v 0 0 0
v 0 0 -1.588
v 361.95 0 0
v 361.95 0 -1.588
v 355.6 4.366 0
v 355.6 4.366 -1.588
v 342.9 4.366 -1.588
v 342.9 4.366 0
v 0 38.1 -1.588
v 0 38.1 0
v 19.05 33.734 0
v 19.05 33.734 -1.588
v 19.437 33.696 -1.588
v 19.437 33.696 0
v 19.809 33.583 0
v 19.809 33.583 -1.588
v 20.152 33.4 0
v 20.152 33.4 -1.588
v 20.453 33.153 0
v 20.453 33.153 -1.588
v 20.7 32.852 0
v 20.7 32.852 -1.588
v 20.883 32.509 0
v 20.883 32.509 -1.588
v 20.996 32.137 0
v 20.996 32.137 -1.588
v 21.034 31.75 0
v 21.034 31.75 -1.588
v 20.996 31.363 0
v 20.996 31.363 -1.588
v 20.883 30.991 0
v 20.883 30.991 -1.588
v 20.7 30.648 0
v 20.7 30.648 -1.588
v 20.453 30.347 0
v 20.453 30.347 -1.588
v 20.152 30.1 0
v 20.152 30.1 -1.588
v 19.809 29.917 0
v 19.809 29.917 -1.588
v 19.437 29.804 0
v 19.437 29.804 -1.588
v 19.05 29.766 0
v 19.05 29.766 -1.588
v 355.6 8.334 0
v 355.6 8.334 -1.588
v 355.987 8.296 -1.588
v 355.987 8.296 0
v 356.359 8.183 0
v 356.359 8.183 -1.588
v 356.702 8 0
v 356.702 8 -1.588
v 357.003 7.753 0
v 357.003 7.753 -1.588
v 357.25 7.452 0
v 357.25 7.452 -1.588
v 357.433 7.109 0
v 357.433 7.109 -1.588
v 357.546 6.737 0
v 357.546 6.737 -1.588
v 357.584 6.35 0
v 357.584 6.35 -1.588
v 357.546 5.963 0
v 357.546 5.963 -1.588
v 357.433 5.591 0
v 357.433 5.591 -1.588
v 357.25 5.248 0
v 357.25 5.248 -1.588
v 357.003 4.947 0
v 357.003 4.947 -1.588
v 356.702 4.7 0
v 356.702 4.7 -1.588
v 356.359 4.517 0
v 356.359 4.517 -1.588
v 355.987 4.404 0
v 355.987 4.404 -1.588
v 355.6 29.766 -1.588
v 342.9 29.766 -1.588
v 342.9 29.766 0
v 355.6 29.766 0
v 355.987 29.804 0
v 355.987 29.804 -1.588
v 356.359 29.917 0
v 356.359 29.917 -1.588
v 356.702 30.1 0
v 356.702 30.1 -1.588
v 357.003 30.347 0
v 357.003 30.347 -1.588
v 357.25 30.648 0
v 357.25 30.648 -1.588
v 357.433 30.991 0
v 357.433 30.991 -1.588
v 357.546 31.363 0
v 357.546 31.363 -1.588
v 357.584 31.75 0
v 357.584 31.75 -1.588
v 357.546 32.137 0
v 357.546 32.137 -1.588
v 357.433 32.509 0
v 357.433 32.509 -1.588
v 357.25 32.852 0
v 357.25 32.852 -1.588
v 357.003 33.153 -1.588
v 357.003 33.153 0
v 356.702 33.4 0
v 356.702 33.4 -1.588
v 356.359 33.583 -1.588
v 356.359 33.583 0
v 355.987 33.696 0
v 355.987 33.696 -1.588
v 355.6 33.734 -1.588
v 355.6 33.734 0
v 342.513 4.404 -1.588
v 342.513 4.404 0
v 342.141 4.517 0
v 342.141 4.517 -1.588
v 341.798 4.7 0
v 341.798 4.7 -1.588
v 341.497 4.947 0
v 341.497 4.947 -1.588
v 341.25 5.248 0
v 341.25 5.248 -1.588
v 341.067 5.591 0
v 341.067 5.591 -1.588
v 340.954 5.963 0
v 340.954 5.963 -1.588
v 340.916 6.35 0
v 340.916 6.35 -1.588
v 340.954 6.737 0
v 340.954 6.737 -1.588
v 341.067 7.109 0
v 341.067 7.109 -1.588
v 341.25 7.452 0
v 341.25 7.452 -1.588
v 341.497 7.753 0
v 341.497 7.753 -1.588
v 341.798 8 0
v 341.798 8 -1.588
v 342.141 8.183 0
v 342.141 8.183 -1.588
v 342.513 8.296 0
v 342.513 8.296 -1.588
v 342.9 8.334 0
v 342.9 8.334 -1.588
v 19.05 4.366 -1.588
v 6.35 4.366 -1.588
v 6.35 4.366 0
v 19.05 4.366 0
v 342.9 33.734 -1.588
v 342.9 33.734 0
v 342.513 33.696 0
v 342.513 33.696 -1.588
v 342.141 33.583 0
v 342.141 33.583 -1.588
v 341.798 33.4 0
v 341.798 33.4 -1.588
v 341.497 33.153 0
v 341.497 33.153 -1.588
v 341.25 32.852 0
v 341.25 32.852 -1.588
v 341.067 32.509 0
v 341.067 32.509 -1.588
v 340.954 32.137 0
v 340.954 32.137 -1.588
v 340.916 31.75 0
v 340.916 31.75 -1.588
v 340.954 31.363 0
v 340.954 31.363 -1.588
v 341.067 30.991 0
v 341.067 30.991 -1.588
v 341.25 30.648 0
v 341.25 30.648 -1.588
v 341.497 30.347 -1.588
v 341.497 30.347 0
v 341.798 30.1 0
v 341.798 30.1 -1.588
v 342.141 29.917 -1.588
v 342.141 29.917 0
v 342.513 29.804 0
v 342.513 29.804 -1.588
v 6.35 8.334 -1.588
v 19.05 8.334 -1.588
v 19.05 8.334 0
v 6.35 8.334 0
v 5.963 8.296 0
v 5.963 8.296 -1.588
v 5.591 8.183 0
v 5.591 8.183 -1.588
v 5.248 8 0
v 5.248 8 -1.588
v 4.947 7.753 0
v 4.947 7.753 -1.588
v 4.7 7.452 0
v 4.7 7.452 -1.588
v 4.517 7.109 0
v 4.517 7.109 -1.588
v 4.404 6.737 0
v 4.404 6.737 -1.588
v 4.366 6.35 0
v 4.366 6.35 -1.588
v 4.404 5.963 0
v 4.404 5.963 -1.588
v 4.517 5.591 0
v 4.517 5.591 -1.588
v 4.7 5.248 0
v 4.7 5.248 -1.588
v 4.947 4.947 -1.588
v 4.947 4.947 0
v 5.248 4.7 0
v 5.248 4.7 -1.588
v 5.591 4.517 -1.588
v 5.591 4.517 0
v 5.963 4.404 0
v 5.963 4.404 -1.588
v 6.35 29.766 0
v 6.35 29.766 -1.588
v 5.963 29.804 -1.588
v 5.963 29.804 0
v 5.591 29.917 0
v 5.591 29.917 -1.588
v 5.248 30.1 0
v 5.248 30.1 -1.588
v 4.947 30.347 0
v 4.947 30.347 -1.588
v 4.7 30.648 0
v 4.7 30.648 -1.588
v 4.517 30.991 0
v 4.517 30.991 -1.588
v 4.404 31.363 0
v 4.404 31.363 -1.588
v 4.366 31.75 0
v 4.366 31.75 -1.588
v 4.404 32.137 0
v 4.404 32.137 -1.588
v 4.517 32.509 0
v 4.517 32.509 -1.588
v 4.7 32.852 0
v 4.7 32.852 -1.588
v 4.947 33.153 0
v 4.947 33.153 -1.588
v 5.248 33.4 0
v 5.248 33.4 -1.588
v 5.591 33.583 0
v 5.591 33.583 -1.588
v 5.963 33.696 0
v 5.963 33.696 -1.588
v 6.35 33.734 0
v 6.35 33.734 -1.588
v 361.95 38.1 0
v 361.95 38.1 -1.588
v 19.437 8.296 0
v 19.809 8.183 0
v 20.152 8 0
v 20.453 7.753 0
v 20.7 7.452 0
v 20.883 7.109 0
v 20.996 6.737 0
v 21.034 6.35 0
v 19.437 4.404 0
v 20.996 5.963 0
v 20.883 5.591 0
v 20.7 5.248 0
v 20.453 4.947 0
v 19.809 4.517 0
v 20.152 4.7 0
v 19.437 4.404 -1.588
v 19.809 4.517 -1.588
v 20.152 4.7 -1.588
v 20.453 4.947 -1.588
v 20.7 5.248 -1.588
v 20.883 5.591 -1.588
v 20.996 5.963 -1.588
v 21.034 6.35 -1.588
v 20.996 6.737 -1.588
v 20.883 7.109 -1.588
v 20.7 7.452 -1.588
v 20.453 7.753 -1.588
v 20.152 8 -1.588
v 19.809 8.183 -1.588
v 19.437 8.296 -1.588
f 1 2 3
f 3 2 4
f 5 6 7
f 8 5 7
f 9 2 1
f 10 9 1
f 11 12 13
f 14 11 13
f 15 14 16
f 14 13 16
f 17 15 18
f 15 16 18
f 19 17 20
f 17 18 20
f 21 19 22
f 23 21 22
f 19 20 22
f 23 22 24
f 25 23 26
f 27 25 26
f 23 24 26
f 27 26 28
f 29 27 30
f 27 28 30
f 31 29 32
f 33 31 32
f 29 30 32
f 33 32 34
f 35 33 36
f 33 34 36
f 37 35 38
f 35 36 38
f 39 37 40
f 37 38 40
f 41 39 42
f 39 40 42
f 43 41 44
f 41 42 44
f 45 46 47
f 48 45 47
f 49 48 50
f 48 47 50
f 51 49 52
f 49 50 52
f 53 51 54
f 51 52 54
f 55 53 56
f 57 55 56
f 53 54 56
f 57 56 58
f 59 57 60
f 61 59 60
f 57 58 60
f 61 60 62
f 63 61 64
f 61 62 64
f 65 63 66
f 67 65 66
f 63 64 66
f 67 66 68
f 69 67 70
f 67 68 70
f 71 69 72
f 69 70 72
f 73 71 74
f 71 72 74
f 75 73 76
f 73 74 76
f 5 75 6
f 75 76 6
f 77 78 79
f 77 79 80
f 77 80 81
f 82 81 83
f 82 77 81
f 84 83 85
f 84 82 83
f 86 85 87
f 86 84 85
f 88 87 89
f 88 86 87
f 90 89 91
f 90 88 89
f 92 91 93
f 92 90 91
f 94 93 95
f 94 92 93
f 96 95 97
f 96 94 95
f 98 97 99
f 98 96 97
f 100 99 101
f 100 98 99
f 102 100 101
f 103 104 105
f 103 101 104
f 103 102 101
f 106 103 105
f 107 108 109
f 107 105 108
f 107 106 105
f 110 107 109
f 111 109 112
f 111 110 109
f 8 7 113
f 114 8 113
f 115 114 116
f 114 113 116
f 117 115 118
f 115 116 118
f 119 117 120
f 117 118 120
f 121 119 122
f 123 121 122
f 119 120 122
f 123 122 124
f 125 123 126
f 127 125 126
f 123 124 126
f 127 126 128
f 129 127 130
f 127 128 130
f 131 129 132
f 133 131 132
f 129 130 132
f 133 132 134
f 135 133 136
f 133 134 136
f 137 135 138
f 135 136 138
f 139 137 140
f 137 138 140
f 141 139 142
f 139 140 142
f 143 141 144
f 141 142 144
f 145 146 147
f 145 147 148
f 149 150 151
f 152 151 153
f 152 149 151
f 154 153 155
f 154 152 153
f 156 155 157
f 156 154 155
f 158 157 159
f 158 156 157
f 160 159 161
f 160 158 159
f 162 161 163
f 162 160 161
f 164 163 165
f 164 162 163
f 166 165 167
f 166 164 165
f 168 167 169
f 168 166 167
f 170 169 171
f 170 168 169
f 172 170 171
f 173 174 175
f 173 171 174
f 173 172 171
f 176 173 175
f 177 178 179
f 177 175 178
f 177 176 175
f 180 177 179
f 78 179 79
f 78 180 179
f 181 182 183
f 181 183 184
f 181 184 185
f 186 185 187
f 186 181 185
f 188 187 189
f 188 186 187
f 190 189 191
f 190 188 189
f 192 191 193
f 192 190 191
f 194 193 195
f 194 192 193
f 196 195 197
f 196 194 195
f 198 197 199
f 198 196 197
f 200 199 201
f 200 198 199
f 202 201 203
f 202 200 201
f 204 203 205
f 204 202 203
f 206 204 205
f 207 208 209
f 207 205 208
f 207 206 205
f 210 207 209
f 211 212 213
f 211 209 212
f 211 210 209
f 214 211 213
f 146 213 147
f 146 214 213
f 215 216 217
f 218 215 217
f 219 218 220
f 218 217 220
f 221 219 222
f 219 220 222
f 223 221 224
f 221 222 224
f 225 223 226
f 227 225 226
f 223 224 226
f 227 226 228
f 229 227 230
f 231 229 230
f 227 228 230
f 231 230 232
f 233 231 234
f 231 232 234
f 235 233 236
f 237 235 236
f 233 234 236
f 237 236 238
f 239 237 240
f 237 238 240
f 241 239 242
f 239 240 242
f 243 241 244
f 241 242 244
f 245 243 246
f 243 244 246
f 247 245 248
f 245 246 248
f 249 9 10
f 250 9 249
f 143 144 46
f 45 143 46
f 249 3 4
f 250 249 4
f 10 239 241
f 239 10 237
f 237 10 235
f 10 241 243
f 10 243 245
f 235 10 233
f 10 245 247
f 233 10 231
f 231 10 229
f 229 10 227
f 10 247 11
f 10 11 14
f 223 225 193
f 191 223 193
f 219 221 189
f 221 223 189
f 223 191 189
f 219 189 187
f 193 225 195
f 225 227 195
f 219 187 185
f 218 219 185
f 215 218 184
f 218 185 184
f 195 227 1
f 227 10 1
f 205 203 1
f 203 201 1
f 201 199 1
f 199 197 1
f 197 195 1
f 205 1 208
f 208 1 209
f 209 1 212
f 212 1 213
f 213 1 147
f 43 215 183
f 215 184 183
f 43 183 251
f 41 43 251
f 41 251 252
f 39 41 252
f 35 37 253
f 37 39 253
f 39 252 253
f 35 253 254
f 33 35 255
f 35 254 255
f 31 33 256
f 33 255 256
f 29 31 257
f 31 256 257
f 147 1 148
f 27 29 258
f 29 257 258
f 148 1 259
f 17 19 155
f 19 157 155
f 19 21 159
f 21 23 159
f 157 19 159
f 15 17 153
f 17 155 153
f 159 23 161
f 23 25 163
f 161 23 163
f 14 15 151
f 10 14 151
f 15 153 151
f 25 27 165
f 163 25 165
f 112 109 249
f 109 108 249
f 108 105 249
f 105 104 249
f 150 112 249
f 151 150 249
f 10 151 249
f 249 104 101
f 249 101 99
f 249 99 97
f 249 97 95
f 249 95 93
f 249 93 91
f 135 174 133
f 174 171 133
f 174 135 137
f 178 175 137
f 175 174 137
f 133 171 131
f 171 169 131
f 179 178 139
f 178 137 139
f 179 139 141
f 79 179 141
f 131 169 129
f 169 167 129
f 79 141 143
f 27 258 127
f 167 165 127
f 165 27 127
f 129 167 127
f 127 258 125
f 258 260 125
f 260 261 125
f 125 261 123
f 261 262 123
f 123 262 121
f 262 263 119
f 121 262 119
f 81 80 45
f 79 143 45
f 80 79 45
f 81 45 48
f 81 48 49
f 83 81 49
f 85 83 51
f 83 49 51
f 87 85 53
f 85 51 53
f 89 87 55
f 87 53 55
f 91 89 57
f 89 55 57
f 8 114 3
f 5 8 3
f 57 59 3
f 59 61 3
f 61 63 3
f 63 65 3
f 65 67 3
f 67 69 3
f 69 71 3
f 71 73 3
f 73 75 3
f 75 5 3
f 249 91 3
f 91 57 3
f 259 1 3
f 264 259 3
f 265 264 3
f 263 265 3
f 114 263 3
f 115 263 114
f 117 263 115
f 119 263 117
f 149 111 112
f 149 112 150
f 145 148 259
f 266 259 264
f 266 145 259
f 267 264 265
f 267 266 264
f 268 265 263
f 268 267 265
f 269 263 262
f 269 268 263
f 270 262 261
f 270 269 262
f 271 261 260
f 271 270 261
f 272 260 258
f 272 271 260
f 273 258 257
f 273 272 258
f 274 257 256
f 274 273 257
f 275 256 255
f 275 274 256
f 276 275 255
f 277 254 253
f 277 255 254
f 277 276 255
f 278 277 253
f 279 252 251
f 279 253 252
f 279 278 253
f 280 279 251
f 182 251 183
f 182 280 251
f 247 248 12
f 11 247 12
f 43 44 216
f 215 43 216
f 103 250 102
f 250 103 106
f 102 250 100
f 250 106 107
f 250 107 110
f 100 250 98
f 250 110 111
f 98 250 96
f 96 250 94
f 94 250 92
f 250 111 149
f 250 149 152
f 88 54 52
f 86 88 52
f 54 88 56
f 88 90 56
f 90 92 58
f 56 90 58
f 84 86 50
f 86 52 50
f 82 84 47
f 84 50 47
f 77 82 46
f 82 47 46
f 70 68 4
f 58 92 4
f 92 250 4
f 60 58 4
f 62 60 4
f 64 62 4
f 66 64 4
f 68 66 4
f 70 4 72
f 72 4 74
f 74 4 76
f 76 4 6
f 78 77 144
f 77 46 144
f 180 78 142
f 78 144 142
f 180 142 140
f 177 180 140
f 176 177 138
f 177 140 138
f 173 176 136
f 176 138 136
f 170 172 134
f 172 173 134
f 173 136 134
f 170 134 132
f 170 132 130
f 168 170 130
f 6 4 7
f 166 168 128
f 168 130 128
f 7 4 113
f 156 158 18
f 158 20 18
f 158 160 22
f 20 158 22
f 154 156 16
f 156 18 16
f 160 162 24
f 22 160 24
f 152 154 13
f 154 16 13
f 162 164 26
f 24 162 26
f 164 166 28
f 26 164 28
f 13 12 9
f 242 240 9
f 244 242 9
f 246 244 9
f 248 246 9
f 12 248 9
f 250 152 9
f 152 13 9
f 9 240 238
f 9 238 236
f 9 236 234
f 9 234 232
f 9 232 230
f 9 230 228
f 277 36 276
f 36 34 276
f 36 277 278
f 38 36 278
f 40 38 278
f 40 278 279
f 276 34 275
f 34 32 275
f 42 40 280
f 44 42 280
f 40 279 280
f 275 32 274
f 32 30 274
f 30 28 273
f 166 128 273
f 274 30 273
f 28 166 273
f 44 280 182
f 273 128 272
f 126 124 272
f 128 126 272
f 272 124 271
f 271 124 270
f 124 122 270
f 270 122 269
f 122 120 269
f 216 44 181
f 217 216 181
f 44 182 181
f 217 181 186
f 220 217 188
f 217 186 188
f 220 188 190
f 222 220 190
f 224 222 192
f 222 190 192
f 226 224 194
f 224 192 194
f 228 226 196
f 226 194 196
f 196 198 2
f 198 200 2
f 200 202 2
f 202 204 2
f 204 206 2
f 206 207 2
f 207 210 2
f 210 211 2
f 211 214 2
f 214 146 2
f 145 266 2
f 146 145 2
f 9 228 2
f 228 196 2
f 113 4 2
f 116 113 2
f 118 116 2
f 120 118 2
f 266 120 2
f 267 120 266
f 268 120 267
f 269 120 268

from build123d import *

# Parameters (mm, degrees)
BOSS_EXTRUDE1_DEPTH = 38.1
CUT_EXTRUDE2_DEPTH  = 2.5875


with BuildPart() as part:
    # Sketch1 → Boss-Extrude1 (new body)
    with BuildSketch(Plane(origin=(0, 0, 0), x_dir=(1, 0, 0), z_dir=(0, 1, 0))):
        Polygon((0, 0), (361.95, 0), (361.95, 1.5875), (336.55, 1.5875), (25.4, 1.5875), (0, 1.5875), align=None)
    extrude(amount=BOSS_EXTRUDE1_DEPTH)

    # Sketch2 → Cut-Extrude2 (cut, through all)
    with BuildSketch(Plane(origin=(0, 0, -1.5875), x_dir=(-1, 0, 0), z_dir=(0, 0, -1))):
        with BuildLine():
            Line((-19.05, 29.765625), (-6.35, 29.765625))
            ThreePointArc((-6.35, 29.765625), (-4.365625, 31.75), (-6.35, 33.734375))
            Line((-6.35, 33.734375), (-19.05, 33.734375))
            ThreePointArc((-19.05, 33.734375), (-21.034375, 31.75), (-19.05, 29.765625))
        make_face()
        with BuildLine():
            ThreePointArc((-6.35, 8.334375), (-4.365625, 6.35), (-6.35, 4.365625))
            Line((-6.35, 4.365625), (-19.05, 4.365625))
            ThreePointArc((-19.05, 4.365625), (-21.034375, 6.35), (-19.05, 8.334375))
            Line((-19.05, 8.334375), (-6.35, 8.334375))
        make_face()
        with BuildLine():
            Line((-342.9, 8.334375), (-355.6, 8.334375))
            ThreePointArc((-355.6, 8.334375), (-357.584375, 6.35), (-355.6, 4.365625))
            Line((-355.6, 4.365625), (-342.9, 4.365625))
            ThreePointArc((-342.9, 4.365625), (-340.915625, 6.35), (-342.9, 8.334375))
        make_face()
        with BuildLine():
            ThreePointArc((-355.6, 29.765625), (-357.584375, 31.75), (-355.6, 33.734375))
            Line((-355.6, 33.734375), (-342.9, 33.734375))
            ThreePointArc((-342.9, 33.734375), (-340.915625, 31.75), (-342.9, 29.765625))
            Line((-342.9, 29.765625), (-355.6, 29.765625))
        make_face()
    extrude(amount=-CUT_EXTRUDE2_DEPTH, mode=Mode.SUBTRACT)


solid = part.part
